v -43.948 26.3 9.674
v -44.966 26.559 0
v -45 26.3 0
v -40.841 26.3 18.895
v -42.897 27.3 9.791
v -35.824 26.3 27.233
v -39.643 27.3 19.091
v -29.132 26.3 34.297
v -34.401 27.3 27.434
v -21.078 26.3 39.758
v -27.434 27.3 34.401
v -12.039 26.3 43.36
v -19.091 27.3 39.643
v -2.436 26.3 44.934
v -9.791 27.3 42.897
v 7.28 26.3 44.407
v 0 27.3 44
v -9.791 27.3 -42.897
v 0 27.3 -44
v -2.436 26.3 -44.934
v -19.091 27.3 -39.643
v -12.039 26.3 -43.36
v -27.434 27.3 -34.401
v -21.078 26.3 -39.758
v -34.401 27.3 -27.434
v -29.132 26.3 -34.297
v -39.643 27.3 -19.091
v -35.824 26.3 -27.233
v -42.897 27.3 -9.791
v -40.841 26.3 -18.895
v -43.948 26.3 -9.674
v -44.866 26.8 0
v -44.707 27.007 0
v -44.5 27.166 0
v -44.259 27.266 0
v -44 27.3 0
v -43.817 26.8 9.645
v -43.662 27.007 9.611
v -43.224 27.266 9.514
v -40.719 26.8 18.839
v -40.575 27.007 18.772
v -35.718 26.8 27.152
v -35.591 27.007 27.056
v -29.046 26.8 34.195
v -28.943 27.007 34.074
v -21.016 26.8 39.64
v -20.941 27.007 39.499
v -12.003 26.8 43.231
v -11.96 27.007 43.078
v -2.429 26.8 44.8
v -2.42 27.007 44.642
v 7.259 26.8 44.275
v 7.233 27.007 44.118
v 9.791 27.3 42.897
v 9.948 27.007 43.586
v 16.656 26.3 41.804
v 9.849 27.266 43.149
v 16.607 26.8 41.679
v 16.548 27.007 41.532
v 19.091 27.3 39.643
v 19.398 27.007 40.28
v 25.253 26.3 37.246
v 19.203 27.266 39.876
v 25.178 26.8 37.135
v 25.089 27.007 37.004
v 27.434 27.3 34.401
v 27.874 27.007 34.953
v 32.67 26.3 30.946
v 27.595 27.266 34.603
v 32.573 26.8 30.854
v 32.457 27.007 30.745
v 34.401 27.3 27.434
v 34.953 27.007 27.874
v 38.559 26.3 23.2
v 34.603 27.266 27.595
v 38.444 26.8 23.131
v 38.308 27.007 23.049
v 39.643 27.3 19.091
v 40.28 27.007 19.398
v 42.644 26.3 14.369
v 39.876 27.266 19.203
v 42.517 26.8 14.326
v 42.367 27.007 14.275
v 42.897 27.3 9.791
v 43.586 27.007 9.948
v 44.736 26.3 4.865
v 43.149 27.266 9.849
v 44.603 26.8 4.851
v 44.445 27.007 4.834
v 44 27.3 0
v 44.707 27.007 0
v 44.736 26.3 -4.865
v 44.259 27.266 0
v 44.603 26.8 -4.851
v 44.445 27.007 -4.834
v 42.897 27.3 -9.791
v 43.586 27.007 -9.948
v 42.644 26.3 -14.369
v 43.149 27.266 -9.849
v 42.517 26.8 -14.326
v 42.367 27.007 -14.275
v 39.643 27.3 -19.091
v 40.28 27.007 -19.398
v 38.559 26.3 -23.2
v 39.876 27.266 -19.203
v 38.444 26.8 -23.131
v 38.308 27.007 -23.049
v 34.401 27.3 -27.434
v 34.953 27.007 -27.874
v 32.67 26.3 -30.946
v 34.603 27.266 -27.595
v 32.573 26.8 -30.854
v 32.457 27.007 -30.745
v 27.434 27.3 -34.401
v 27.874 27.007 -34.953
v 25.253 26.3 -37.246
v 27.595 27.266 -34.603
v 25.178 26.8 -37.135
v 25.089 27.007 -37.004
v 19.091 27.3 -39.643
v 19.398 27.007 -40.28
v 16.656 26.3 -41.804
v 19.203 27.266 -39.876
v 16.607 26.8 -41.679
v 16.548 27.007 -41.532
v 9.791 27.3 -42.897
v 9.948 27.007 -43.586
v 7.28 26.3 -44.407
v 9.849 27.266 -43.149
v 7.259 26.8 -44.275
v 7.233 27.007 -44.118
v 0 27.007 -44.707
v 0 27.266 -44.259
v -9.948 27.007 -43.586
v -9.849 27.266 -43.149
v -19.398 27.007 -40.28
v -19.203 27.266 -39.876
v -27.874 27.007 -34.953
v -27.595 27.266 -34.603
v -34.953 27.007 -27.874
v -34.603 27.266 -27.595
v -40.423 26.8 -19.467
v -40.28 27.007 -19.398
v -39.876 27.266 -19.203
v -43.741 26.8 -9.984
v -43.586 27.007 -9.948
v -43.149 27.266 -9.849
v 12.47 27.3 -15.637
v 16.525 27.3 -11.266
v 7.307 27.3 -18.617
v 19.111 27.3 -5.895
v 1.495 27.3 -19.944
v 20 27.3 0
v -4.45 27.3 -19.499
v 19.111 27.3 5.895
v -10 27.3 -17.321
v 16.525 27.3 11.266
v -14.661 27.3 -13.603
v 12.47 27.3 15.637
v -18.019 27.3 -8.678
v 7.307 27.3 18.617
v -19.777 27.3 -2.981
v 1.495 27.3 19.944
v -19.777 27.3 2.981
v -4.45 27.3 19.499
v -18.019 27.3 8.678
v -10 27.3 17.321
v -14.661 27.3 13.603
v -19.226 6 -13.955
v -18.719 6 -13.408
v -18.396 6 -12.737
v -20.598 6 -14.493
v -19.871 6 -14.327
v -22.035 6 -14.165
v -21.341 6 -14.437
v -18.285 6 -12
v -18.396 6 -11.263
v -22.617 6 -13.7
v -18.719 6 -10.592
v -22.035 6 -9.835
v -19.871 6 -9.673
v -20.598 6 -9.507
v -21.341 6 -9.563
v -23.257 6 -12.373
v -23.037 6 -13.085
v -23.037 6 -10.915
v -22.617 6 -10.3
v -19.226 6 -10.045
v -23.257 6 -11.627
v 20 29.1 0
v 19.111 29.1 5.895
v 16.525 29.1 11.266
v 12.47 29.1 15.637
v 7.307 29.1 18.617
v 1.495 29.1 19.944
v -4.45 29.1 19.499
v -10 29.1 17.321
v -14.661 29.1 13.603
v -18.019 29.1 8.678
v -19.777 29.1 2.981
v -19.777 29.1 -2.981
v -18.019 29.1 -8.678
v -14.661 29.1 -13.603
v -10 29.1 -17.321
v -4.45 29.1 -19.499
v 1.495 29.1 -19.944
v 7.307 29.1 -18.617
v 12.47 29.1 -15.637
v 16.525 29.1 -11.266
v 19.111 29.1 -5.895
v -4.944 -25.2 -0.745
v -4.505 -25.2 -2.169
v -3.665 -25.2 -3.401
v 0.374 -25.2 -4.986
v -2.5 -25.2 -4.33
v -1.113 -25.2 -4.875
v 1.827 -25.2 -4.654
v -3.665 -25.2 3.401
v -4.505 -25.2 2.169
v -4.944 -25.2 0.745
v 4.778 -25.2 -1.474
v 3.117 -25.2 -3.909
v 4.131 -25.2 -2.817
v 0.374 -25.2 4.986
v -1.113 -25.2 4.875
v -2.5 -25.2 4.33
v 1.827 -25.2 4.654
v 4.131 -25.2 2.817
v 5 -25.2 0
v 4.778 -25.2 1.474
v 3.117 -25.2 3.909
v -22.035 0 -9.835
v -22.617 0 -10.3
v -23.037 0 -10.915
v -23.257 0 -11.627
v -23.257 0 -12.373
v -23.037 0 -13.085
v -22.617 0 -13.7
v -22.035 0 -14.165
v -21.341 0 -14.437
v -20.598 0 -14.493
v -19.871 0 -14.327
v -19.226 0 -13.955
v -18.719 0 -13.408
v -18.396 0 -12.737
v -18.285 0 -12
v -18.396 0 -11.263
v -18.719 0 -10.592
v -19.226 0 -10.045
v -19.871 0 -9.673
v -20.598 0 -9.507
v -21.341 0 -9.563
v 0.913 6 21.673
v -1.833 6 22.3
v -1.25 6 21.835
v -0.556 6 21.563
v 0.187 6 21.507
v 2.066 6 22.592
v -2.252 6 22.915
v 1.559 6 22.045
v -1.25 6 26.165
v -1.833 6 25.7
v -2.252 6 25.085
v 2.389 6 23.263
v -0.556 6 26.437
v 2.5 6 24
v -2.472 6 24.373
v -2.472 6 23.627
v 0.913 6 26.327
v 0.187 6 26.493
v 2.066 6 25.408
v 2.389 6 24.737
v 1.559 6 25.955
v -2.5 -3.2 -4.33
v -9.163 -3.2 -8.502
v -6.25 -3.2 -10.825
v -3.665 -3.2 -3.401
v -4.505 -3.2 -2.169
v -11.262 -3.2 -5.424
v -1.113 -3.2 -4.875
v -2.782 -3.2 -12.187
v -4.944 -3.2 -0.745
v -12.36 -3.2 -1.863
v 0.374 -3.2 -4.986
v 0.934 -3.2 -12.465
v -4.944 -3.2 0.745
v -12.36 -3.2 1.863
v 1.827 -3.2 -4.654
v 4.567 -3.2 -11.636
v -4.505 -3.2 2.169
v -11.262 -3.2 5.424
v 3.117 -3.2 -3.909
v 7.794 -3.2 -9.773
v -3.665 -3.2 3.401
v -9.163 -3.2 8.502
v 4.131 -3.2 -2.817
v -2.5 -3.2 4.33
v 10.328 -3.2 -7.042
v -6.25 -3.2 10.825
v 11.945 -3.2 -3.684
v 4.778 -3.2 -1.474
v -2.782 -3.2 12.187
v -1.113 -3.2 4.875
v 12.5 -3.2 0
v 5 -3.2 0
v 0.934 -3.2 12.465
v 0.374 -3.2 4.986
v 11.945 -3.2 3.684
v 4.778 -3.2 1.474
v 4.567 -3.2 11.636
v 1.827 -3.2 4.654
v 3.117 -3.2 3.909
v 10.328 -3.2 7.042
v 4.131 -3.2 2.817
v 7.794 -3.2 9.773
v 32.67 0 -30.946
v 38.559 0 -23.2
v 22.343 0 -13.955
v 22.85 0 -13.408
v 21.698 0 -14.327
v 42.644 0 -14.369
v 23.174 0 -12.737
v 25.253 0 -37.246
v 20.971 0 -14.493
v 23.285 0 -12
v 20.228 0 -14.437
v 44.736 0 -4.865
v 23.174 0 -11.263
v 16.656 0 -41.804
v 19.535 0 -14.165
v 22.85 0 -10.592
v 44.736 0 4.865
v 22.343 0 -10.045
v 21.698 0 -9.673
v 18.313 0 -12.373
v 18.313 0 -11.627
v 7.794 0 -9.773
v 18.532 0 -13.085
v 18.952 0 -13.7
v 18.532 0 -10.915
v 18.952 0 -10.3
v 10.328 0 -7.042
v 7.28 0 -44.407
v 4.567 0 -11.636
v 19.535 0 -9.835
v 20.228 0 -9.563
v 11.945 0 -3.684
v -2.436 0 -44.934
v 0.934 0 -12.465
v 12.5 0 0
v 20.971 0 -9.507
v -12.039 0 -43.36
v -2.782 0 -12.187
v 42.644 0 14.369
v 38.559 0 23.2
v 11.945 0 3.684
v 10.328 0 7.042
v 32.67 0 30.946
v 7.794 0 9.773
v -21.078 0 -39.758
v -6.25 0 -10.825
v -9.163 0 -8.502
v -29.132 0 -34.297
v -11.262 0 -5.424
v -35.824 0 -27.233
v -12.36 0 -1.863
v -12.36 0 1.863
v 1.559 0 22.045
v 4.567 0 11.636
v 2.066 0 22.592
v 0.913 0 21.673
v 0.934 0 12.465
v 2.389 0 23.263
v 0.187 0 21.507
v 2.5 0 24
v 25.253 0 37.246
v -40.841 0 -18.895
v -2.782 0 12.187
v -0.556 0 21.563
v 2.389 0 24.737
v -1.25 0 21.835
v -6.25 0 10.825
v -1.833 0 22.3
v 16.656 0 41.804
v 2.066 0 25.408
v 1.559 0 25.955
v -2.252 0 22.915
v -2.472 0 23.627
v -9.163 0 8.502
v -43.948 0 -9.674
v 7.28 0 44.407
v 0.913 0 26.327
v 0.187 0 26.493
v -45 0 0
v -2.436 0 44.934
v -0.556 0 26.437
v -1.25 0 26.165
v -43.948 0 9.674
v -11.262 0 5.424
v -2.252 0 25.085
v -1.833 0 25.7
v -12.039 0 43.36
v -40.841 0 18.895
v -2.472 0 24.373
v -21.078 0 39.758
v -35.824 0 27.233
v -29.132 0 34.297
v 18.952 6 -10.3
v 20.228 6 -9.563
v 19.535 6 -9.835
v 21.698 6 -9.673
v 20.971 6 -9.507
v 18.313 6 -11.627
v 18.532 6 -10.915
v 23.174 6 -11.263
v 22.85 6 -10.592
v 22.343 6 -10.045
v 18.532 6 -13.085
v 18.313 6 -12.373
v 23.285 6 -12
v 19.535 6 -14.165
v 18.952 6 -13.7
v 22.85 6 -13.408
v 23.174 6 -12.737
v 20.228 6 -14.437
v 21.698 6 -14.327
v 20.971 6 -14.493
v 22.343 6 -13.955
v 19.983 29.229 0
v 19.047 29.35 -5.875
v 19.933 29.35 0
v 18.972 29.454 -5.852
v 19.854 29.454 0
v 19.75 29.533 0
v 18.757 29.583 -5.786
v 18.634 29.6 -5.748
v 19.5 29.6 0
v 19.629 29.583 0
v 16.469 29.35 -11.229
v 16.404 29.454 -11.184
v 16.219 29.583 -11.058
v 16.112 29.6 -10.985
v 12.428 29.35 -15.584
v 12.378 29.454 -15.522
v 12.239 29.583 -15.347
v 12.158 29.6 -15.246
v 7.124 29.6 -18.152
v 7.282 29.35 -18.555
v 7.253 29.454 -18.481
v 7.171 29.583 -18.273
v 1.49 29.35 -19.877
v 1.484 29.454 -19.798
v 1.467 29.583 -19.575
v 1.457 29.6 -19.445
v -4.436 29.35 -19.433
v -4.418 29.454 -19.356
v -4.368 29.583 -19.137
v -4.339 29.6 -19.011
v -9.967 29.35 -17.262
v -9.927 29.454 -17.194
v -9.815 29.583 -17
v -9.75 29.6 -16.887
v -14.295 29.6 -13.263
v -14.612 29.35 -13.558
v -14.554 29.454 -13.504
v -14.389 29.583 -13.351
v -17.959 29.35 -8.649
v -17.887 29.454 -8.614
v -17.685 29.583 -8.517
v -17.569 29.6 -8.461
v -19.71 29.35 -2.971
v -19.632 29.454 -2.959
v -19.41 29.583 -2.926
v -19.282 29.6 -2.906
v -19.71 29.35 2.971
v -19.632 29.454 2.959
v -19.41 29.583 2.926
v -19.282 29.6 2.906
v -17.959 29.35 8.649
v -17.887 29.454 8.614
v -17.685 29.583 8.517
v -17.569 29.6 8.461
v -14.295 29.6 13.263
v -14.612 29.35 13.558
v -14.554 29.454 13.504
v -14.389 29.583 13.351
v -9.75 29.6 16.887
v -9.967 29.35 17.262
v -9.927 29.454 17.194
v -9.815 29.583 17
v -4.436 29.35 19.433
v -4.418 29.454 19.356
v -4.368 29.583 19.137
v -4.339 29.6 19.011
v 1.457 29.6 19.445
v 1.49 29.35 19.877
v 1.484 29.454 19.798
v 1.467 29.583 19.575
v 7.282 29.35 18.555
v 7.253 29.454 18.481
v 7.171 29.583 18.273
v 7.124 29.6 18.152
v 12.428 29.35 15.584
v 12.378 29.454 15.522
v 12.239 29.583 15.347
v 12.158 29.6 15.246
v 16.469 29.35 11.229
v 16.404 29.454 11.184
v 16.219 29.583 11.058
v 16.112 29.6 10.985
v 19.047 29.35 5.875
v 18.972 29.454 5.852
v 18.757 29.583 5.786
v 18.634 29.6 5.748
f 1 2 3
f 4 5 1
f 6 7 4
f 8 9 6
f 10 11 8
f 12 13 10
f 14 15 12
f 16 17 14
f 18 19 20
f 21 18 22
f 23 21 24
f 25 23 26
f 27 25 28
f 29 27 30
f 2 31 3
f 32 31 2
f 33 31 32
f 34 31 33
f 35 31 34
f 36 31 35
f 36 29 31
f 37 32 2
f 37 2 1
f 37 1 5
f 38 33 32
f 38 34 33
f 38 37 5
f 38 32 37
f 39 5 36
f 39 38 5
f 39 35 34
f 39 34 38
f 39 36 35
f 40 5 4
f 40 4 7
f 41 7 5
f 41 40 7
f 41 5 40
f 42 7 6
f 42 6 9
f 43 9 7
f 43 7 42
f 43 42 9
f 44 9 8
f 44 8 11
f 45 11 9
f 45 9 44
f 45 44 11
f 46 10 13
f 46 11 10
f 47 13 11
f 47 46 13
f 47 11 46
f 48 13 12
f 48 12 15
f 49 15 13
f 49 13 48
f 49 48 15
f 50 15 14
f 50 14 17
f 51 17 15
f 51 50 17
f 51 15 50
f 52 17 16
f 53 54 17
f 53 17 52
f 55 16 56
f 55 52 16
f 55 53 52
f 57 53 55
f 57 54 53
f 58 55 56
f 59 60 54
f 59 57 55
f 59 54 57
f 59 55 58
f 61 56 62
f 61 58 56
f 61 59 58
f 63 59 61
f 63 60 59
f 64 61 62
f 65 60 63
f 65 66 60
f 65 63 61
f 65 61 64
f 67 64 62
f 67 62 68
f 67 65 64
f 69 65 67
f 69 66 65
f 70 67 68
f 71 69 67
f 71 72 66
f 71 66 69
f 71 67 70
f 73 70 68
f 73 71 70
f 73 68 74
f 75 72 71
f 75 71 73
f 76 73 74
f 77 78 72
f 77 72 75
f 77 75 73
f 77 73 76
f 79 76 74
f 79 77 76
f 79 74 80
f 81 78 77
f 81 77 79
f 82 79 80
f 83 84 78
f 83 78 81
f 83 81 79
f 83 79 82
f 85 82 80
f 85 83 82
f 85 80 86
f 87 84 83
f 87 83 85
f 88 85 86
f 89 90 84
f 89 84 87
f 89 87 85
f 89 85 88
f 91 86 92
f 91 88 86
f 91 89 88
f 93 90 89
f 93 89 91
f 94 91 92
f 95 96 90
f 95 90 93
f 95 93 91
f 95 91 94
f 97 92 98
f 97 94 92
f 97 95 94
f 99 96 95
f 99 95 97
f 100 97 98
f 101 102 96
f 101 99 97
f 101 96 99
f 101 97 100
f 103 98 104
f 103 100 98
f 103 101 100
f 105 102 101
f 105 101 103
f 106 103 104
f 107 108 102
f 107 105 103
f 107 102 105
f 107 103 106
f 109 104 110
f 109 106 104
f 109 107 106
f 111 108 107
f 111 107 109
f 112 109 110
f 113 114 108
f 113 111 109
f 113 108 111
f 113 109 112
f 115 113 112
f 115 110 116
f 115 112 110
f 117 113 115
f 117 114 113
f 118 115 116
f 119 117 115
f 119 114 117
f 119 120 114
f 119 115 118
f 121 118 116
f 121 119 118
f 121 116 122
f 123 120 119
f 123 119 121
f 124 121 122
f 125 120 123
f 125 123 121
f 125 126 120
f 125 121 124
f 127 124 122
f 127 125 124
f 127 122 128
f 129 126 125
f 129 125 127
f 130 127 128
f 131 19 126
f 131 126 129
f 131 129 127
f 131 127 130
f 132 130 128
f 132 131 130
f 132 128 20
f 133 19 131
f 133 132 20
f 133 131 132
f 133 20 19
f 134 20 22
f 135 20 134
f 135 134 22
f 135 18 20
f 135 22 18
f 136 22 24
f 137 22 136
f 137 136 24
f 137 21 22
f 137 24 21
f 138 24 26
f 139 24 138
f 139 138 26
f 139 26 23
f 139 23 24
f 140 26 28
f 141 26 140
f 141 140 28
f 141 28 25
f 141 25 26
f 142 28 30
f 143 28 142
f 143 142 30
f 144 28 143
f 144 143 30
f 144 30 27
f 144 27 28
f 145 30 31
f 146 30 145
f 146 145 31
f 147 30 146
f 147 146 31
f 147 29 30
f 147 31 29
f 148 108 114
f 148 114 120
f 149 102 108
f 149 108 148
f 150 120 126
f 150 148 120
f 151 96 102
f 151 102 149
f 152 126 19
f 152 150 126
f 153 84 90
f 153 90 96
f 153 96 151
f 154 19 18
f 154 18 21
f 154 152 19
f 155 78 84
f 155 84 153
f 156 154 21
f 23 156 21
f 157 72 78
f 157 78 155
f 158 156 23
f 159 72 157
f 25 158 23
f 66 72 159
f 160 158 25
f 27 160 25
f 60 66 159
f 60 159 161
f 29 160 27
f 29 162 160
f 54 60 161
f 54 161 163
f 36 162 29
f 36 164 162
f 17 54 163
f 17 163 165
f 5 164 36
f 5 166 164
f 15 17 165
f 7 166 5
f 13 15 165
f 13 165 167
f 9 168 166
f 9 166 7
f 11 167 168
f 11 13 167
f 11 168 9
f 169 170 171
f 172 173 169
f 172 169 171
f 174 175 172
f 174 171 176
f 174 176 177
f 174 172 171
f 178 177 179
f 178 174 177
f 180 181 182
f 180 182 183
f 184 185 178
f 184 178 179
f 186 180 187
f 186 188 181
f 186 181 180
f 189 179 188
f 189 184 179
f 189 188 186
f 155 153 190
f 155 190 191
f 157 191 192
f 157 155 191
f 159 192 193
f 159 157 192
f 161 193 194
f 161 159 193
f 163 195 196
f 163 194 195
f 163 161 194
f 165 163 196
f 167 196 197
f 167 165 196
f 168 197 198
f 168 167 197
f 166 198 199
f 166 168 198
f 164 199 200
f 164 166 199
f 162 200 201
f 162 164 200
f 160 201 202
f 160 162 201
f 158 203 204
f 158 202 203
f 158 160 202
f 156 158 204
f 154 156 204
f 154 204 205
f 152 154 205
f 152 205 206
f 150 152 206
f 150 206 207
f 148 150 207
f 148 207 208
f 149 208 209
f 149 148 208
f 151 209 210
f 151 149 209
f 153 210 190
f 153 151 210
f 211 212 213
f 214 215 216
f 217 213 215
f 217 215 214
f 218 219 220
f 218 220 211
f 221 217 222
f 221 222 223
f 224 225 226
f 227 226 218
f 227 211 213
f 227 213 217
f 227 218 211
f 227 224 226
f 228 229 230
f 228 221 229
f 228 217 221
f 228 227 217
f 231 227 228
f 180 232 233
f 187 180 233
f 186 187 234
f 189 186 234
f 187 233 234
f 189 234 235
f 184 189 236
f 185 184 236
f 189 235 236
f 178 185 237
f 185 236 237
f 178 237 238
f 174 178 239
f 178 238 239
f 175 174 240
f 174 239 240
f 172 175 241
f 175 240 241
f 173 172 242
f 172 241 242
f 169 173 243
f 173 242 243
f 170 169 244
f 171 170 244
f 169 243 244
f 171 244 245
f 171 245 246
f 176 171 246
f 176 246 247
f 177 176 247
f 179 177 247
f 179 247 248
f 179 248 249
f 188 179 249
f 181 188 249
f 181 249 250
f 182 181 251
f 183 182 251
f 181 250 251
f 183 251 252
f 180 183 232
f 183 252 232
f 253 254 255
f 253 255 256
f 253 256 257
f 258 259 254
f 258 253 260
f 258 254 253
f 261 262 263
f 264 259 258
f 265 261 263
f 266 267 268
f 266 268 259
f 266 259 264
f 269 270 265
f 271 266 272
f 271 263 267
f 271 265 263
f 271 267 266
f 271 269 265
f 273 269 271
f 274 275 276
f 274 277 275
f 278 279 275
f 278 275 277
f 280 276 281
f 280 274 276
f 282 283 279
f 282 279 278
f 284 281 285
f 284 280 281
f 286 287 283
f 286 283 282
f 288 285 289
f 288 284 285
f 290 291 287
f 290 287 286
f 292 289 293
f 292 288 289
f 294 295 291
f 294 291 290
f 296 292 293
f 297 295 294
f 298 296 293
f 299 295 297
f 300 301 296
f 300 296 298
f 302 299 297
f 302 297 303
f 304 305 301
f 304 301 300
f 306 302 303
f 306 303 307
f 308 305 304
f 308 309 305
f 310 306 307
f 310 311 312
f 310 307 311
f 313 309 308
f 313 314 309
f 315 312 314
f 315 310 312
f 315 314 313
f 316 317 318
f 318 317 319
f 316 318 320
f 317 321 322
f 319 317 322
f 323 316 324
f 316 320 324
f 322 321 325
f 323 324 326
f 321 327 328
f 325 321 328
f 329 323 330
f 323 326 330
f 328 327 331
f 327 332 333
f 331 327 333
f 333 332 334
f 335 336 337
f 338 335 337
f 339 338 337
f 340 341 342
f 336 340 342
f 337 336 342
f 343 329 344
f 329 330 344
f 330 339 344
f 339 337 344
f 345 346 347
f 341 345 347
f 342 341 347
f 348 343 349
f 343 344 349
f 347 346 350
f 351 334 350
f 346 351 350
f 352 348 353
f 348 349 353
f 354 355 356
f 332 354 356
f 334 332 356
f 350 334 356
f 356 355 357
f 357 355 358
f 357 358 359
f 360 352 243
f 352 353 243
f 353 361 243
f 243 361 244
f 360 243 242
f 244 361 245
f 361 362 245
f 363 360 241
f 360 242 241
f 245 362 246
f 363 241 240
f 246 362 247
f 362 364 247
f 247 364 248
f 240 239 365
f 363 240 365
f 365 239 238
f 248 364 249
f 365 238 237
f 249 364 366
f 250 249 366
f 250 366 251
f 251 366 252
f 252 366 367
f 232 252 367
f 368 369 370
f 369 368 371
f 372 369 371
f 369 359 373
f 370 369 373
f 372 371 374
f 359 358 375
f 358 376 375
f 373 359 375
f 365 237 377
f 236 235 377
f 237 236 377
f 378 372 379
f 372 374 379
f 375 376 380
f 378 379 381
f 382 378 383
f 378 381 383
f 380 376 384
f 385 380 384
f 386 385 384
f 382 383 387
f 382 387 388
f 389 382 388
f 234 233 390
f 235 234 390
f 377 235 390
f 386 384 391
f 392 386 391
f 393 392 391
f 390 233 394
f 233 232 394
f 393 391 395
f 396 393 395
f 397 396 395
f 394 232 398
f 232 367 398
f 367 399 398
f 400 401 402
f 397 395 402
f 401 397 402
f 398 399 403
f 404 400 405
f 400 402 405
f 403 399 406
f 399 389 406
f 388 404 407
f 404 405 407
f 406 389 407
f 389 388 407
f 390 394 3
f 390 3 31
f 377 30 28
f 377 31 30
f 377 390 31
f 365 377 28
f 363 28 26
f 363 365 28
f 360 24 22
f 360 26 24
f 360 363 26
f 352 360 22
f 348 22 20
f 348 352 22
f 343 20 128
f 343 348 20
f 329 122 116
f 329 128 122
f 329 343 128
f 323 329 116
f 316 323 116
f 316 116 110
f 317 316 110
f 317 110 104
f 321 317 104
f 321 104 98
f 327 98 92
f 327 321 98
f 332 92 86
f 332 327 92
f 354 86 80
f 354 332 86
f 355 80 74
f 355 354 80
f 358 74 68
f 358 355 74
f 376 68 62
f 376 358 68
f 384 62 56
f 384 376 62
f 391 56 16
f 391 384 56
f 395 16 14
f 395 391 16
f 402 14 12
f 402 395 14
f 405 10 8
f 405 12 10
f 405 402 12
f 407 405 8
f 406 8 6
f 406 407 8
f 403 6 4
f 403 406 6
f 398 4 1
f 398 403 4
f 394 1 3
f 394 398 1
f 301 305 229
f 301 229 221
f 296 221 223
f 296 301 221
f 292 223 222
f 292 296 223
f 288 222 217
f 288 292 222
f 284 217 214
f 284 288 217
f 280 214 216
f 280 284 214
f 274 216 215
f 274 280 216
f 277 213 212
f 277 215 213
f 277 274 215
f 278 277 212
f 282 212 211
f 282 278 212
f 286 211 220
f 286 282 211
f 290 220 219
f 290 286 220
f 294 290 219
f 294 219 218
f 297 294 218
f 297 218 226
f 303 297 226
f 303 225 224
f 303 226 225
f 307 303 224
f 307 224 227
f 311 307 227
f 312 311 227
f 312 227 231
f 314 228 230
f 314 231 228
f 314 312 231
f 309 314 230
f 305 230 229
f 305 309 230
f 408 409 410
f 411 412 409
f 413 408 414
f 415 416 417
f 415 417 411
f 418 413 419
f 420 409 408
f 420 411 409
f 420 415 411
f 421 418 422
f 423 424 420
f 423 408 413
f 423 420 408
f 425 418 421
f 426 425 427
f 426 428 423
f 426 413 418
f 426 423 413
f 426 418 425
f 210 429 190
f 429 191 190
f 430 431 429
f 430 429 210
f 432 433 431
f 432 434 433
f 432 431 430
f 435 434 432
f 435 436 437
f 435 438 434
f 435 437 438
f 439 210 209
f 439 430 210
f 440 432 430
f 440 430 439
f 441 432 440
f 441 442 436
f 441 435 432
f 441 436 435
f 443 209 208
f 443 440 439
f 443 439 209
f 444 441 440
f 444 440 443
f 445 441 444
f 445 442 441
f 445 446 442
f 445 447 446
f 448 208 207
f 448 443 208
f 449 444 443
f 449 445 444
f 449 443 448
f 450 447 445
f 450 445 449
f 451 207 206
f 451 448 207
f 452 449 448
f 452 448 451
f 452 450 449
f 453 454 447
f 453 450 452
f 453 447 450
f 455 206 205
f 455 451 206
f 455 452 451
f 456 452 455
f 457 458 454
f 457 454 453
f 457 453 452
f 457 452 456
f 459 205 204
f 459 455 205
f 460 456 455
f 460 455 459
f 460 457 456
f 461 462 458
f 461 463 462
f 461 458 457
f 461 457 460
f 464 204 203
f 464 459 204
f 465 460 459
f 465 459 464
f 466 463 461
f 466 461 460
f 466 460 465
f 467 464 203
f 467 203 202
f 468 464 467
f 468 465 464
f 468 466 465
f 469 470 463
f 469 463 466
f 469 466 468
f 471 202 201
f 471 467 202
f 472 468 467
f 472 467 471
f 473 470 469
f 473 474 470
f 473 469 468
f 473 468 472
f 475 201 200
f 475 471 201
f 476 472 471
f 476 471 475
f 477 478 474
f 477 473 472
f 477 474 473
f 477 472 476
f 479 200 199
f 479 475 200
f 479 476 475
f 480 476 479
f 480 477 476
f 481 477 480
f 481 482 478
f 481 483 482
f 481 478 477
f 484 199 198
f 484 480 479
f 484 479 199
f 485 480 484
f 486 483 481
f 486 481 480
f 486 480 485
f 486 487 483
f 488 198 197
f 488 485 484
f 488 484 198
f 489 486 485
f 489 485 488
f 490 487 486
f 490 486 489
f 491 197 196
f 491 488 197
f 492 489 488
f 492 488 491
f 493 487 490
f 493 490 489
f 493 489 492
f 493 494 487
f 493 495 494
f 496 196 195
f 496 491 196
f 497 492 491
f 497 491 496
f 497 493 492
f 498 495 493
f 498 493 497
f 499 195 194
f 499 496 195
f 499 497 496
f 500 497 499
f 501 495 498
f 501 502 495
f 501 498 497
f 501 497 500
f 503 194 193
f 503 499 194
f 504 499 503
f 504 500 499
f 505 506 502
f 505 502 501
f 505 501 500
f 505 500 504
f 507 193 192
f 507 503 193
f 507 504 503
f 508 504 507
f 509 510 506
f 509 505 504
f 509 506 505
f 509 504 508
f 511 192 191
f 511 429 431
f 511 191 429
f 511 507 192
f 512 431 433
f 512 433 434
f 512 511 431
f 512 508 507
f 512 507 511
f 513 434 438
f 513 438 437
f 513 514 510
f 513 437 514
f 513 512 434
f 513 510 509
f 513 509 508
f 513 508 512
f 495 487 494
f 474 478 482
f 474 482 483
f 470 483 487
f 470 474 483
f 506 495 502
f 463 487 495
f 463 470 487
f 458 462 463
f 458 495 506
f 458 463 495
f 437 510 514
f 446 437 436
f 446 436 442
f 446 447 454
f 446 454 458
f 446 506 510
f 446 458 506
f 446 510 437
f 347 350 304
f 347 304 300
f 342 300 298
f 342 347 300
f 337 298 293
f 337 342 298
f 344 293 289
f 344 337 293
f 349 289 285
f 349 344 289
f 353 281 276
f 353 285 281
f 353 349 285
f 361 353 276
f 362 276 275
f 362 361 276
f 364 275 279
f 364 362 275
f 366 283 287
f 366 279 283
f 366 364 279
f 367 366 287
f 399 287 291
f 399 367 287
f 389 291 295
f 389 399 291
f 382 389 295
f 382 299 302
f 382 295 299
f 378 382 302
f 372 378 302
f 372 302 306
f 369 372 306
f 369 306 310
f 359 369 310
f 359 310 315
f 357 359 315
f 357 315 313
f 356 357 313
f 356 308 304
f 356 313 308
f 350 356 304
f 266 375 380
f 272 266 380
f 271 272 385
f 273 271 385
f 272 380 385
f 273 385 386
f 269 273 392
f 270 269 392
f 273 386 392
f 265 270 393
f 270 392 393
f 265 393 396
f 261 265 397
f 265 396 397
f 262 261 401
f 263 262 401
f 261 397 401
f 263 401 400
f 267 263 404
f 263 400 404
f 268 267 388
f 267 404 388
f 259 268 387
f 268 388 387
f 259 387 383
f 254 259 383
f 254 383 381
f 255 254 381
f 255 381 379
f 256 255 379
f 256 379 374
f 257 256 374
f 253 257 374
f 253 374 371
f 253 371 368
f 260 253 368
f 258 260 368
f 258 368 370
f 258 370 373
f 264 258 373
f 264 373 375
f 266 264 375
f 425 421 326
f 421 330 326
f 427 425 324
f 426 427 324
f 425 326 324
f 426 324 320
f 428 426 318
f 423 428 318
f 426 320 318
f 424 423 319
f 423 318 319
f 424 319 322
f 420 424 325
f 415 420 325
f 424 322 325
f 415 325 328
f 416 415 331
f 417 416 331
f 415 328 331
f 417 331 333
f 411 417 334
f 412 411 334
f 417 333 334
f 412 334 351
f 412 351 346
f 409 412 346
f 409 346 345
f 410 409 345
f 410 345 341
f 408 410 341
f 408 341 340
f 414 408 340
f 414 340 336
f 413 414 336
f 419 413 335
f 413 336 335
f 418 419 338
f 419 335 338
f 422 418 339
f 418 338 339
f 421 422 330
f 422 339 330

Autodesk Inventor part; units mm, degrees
ref_plane "YZ Plane" through (0, 0, 0) normal (1, 0, 0) x (0, 1, 0)
ref_plane "XZ Plane" through (0, 0, 0) normal (0, 1, 0) x (-1, 0, 0)
ref_plane "XY Plane" through (0, 0, 0) normal (0, 0, 1) x (1, 0, 0)
sketch "Esquisse1" plane through (0, 0, 0) normal (0, 1, 0) x (-1, 0, 0)
  circle A0 centre (0, 0) radius 45
  dimension "d0" = 90
extrude "Extrusion1" add sketch "Esquisse1" along normal blind 27.3
fillet "Congé1" radius 1 1 edges at (45, 27.3, 0)
sketch "Esquisse2" plane through (0, 27.3, 0) normal (0, 1, 0) x (1, 0, 0)
  circle A0 centre (0, 0) radius 44 projected
  circle A1 centre (0, 0) radius 20
  dimension "d4" = 40
extrude "Extrusion2" add sketch "Esquisse2" along normal blind 2.3 contours A1
fillet "Congé2" radius 0.5 1 edges at (-20, 29.6, 0)
sketch "Esquisse3" plane through (0, 0, 0) normal (0, -1, 0) x (1, 0, 0)
  circle A0 centre (0, 0) radius 45 projected
  circle A1 centre (0, 0) radius 12.5
  dimension "d8" = 25
extrude "Extrusion3" add sketch "Esquisse3" along normal blind 3.2 contours A1
sketch "Esquisse5" plane through (0, -3.2, 0) normal (0, -1, 0) x (1, 0, 0)
  circle A0 centre (0, 0) radius 12.5 projected
  circle A1 centre (0, 0) radius 5
  dimension "d11" = 10
extrude "Extrusion4" add sketch "Esquisse5" along normal blind 22 contours A1
sketch "Esquisse6" plane through (0, 0, 0) normal (0, -1, 0) x (1, 0, 0)
  circle A0 centre (0, 0) radius 12.5 projected
  circle A1 centre (0, 24) radius 2.5
  dimension "d14" = 5
  dimension "d15" = 24
extrude "Extrusion5" cut sketch "Esquisse6" against normal blind 6 contours A1
pattern_circular "Réseau circulaire1" count 3 over 360 about axis through (0, 0, 0) along (0, -1, 0) of "Extrusion5"
properties part number "Moteur MAxon" material "Acier inoxydable"
